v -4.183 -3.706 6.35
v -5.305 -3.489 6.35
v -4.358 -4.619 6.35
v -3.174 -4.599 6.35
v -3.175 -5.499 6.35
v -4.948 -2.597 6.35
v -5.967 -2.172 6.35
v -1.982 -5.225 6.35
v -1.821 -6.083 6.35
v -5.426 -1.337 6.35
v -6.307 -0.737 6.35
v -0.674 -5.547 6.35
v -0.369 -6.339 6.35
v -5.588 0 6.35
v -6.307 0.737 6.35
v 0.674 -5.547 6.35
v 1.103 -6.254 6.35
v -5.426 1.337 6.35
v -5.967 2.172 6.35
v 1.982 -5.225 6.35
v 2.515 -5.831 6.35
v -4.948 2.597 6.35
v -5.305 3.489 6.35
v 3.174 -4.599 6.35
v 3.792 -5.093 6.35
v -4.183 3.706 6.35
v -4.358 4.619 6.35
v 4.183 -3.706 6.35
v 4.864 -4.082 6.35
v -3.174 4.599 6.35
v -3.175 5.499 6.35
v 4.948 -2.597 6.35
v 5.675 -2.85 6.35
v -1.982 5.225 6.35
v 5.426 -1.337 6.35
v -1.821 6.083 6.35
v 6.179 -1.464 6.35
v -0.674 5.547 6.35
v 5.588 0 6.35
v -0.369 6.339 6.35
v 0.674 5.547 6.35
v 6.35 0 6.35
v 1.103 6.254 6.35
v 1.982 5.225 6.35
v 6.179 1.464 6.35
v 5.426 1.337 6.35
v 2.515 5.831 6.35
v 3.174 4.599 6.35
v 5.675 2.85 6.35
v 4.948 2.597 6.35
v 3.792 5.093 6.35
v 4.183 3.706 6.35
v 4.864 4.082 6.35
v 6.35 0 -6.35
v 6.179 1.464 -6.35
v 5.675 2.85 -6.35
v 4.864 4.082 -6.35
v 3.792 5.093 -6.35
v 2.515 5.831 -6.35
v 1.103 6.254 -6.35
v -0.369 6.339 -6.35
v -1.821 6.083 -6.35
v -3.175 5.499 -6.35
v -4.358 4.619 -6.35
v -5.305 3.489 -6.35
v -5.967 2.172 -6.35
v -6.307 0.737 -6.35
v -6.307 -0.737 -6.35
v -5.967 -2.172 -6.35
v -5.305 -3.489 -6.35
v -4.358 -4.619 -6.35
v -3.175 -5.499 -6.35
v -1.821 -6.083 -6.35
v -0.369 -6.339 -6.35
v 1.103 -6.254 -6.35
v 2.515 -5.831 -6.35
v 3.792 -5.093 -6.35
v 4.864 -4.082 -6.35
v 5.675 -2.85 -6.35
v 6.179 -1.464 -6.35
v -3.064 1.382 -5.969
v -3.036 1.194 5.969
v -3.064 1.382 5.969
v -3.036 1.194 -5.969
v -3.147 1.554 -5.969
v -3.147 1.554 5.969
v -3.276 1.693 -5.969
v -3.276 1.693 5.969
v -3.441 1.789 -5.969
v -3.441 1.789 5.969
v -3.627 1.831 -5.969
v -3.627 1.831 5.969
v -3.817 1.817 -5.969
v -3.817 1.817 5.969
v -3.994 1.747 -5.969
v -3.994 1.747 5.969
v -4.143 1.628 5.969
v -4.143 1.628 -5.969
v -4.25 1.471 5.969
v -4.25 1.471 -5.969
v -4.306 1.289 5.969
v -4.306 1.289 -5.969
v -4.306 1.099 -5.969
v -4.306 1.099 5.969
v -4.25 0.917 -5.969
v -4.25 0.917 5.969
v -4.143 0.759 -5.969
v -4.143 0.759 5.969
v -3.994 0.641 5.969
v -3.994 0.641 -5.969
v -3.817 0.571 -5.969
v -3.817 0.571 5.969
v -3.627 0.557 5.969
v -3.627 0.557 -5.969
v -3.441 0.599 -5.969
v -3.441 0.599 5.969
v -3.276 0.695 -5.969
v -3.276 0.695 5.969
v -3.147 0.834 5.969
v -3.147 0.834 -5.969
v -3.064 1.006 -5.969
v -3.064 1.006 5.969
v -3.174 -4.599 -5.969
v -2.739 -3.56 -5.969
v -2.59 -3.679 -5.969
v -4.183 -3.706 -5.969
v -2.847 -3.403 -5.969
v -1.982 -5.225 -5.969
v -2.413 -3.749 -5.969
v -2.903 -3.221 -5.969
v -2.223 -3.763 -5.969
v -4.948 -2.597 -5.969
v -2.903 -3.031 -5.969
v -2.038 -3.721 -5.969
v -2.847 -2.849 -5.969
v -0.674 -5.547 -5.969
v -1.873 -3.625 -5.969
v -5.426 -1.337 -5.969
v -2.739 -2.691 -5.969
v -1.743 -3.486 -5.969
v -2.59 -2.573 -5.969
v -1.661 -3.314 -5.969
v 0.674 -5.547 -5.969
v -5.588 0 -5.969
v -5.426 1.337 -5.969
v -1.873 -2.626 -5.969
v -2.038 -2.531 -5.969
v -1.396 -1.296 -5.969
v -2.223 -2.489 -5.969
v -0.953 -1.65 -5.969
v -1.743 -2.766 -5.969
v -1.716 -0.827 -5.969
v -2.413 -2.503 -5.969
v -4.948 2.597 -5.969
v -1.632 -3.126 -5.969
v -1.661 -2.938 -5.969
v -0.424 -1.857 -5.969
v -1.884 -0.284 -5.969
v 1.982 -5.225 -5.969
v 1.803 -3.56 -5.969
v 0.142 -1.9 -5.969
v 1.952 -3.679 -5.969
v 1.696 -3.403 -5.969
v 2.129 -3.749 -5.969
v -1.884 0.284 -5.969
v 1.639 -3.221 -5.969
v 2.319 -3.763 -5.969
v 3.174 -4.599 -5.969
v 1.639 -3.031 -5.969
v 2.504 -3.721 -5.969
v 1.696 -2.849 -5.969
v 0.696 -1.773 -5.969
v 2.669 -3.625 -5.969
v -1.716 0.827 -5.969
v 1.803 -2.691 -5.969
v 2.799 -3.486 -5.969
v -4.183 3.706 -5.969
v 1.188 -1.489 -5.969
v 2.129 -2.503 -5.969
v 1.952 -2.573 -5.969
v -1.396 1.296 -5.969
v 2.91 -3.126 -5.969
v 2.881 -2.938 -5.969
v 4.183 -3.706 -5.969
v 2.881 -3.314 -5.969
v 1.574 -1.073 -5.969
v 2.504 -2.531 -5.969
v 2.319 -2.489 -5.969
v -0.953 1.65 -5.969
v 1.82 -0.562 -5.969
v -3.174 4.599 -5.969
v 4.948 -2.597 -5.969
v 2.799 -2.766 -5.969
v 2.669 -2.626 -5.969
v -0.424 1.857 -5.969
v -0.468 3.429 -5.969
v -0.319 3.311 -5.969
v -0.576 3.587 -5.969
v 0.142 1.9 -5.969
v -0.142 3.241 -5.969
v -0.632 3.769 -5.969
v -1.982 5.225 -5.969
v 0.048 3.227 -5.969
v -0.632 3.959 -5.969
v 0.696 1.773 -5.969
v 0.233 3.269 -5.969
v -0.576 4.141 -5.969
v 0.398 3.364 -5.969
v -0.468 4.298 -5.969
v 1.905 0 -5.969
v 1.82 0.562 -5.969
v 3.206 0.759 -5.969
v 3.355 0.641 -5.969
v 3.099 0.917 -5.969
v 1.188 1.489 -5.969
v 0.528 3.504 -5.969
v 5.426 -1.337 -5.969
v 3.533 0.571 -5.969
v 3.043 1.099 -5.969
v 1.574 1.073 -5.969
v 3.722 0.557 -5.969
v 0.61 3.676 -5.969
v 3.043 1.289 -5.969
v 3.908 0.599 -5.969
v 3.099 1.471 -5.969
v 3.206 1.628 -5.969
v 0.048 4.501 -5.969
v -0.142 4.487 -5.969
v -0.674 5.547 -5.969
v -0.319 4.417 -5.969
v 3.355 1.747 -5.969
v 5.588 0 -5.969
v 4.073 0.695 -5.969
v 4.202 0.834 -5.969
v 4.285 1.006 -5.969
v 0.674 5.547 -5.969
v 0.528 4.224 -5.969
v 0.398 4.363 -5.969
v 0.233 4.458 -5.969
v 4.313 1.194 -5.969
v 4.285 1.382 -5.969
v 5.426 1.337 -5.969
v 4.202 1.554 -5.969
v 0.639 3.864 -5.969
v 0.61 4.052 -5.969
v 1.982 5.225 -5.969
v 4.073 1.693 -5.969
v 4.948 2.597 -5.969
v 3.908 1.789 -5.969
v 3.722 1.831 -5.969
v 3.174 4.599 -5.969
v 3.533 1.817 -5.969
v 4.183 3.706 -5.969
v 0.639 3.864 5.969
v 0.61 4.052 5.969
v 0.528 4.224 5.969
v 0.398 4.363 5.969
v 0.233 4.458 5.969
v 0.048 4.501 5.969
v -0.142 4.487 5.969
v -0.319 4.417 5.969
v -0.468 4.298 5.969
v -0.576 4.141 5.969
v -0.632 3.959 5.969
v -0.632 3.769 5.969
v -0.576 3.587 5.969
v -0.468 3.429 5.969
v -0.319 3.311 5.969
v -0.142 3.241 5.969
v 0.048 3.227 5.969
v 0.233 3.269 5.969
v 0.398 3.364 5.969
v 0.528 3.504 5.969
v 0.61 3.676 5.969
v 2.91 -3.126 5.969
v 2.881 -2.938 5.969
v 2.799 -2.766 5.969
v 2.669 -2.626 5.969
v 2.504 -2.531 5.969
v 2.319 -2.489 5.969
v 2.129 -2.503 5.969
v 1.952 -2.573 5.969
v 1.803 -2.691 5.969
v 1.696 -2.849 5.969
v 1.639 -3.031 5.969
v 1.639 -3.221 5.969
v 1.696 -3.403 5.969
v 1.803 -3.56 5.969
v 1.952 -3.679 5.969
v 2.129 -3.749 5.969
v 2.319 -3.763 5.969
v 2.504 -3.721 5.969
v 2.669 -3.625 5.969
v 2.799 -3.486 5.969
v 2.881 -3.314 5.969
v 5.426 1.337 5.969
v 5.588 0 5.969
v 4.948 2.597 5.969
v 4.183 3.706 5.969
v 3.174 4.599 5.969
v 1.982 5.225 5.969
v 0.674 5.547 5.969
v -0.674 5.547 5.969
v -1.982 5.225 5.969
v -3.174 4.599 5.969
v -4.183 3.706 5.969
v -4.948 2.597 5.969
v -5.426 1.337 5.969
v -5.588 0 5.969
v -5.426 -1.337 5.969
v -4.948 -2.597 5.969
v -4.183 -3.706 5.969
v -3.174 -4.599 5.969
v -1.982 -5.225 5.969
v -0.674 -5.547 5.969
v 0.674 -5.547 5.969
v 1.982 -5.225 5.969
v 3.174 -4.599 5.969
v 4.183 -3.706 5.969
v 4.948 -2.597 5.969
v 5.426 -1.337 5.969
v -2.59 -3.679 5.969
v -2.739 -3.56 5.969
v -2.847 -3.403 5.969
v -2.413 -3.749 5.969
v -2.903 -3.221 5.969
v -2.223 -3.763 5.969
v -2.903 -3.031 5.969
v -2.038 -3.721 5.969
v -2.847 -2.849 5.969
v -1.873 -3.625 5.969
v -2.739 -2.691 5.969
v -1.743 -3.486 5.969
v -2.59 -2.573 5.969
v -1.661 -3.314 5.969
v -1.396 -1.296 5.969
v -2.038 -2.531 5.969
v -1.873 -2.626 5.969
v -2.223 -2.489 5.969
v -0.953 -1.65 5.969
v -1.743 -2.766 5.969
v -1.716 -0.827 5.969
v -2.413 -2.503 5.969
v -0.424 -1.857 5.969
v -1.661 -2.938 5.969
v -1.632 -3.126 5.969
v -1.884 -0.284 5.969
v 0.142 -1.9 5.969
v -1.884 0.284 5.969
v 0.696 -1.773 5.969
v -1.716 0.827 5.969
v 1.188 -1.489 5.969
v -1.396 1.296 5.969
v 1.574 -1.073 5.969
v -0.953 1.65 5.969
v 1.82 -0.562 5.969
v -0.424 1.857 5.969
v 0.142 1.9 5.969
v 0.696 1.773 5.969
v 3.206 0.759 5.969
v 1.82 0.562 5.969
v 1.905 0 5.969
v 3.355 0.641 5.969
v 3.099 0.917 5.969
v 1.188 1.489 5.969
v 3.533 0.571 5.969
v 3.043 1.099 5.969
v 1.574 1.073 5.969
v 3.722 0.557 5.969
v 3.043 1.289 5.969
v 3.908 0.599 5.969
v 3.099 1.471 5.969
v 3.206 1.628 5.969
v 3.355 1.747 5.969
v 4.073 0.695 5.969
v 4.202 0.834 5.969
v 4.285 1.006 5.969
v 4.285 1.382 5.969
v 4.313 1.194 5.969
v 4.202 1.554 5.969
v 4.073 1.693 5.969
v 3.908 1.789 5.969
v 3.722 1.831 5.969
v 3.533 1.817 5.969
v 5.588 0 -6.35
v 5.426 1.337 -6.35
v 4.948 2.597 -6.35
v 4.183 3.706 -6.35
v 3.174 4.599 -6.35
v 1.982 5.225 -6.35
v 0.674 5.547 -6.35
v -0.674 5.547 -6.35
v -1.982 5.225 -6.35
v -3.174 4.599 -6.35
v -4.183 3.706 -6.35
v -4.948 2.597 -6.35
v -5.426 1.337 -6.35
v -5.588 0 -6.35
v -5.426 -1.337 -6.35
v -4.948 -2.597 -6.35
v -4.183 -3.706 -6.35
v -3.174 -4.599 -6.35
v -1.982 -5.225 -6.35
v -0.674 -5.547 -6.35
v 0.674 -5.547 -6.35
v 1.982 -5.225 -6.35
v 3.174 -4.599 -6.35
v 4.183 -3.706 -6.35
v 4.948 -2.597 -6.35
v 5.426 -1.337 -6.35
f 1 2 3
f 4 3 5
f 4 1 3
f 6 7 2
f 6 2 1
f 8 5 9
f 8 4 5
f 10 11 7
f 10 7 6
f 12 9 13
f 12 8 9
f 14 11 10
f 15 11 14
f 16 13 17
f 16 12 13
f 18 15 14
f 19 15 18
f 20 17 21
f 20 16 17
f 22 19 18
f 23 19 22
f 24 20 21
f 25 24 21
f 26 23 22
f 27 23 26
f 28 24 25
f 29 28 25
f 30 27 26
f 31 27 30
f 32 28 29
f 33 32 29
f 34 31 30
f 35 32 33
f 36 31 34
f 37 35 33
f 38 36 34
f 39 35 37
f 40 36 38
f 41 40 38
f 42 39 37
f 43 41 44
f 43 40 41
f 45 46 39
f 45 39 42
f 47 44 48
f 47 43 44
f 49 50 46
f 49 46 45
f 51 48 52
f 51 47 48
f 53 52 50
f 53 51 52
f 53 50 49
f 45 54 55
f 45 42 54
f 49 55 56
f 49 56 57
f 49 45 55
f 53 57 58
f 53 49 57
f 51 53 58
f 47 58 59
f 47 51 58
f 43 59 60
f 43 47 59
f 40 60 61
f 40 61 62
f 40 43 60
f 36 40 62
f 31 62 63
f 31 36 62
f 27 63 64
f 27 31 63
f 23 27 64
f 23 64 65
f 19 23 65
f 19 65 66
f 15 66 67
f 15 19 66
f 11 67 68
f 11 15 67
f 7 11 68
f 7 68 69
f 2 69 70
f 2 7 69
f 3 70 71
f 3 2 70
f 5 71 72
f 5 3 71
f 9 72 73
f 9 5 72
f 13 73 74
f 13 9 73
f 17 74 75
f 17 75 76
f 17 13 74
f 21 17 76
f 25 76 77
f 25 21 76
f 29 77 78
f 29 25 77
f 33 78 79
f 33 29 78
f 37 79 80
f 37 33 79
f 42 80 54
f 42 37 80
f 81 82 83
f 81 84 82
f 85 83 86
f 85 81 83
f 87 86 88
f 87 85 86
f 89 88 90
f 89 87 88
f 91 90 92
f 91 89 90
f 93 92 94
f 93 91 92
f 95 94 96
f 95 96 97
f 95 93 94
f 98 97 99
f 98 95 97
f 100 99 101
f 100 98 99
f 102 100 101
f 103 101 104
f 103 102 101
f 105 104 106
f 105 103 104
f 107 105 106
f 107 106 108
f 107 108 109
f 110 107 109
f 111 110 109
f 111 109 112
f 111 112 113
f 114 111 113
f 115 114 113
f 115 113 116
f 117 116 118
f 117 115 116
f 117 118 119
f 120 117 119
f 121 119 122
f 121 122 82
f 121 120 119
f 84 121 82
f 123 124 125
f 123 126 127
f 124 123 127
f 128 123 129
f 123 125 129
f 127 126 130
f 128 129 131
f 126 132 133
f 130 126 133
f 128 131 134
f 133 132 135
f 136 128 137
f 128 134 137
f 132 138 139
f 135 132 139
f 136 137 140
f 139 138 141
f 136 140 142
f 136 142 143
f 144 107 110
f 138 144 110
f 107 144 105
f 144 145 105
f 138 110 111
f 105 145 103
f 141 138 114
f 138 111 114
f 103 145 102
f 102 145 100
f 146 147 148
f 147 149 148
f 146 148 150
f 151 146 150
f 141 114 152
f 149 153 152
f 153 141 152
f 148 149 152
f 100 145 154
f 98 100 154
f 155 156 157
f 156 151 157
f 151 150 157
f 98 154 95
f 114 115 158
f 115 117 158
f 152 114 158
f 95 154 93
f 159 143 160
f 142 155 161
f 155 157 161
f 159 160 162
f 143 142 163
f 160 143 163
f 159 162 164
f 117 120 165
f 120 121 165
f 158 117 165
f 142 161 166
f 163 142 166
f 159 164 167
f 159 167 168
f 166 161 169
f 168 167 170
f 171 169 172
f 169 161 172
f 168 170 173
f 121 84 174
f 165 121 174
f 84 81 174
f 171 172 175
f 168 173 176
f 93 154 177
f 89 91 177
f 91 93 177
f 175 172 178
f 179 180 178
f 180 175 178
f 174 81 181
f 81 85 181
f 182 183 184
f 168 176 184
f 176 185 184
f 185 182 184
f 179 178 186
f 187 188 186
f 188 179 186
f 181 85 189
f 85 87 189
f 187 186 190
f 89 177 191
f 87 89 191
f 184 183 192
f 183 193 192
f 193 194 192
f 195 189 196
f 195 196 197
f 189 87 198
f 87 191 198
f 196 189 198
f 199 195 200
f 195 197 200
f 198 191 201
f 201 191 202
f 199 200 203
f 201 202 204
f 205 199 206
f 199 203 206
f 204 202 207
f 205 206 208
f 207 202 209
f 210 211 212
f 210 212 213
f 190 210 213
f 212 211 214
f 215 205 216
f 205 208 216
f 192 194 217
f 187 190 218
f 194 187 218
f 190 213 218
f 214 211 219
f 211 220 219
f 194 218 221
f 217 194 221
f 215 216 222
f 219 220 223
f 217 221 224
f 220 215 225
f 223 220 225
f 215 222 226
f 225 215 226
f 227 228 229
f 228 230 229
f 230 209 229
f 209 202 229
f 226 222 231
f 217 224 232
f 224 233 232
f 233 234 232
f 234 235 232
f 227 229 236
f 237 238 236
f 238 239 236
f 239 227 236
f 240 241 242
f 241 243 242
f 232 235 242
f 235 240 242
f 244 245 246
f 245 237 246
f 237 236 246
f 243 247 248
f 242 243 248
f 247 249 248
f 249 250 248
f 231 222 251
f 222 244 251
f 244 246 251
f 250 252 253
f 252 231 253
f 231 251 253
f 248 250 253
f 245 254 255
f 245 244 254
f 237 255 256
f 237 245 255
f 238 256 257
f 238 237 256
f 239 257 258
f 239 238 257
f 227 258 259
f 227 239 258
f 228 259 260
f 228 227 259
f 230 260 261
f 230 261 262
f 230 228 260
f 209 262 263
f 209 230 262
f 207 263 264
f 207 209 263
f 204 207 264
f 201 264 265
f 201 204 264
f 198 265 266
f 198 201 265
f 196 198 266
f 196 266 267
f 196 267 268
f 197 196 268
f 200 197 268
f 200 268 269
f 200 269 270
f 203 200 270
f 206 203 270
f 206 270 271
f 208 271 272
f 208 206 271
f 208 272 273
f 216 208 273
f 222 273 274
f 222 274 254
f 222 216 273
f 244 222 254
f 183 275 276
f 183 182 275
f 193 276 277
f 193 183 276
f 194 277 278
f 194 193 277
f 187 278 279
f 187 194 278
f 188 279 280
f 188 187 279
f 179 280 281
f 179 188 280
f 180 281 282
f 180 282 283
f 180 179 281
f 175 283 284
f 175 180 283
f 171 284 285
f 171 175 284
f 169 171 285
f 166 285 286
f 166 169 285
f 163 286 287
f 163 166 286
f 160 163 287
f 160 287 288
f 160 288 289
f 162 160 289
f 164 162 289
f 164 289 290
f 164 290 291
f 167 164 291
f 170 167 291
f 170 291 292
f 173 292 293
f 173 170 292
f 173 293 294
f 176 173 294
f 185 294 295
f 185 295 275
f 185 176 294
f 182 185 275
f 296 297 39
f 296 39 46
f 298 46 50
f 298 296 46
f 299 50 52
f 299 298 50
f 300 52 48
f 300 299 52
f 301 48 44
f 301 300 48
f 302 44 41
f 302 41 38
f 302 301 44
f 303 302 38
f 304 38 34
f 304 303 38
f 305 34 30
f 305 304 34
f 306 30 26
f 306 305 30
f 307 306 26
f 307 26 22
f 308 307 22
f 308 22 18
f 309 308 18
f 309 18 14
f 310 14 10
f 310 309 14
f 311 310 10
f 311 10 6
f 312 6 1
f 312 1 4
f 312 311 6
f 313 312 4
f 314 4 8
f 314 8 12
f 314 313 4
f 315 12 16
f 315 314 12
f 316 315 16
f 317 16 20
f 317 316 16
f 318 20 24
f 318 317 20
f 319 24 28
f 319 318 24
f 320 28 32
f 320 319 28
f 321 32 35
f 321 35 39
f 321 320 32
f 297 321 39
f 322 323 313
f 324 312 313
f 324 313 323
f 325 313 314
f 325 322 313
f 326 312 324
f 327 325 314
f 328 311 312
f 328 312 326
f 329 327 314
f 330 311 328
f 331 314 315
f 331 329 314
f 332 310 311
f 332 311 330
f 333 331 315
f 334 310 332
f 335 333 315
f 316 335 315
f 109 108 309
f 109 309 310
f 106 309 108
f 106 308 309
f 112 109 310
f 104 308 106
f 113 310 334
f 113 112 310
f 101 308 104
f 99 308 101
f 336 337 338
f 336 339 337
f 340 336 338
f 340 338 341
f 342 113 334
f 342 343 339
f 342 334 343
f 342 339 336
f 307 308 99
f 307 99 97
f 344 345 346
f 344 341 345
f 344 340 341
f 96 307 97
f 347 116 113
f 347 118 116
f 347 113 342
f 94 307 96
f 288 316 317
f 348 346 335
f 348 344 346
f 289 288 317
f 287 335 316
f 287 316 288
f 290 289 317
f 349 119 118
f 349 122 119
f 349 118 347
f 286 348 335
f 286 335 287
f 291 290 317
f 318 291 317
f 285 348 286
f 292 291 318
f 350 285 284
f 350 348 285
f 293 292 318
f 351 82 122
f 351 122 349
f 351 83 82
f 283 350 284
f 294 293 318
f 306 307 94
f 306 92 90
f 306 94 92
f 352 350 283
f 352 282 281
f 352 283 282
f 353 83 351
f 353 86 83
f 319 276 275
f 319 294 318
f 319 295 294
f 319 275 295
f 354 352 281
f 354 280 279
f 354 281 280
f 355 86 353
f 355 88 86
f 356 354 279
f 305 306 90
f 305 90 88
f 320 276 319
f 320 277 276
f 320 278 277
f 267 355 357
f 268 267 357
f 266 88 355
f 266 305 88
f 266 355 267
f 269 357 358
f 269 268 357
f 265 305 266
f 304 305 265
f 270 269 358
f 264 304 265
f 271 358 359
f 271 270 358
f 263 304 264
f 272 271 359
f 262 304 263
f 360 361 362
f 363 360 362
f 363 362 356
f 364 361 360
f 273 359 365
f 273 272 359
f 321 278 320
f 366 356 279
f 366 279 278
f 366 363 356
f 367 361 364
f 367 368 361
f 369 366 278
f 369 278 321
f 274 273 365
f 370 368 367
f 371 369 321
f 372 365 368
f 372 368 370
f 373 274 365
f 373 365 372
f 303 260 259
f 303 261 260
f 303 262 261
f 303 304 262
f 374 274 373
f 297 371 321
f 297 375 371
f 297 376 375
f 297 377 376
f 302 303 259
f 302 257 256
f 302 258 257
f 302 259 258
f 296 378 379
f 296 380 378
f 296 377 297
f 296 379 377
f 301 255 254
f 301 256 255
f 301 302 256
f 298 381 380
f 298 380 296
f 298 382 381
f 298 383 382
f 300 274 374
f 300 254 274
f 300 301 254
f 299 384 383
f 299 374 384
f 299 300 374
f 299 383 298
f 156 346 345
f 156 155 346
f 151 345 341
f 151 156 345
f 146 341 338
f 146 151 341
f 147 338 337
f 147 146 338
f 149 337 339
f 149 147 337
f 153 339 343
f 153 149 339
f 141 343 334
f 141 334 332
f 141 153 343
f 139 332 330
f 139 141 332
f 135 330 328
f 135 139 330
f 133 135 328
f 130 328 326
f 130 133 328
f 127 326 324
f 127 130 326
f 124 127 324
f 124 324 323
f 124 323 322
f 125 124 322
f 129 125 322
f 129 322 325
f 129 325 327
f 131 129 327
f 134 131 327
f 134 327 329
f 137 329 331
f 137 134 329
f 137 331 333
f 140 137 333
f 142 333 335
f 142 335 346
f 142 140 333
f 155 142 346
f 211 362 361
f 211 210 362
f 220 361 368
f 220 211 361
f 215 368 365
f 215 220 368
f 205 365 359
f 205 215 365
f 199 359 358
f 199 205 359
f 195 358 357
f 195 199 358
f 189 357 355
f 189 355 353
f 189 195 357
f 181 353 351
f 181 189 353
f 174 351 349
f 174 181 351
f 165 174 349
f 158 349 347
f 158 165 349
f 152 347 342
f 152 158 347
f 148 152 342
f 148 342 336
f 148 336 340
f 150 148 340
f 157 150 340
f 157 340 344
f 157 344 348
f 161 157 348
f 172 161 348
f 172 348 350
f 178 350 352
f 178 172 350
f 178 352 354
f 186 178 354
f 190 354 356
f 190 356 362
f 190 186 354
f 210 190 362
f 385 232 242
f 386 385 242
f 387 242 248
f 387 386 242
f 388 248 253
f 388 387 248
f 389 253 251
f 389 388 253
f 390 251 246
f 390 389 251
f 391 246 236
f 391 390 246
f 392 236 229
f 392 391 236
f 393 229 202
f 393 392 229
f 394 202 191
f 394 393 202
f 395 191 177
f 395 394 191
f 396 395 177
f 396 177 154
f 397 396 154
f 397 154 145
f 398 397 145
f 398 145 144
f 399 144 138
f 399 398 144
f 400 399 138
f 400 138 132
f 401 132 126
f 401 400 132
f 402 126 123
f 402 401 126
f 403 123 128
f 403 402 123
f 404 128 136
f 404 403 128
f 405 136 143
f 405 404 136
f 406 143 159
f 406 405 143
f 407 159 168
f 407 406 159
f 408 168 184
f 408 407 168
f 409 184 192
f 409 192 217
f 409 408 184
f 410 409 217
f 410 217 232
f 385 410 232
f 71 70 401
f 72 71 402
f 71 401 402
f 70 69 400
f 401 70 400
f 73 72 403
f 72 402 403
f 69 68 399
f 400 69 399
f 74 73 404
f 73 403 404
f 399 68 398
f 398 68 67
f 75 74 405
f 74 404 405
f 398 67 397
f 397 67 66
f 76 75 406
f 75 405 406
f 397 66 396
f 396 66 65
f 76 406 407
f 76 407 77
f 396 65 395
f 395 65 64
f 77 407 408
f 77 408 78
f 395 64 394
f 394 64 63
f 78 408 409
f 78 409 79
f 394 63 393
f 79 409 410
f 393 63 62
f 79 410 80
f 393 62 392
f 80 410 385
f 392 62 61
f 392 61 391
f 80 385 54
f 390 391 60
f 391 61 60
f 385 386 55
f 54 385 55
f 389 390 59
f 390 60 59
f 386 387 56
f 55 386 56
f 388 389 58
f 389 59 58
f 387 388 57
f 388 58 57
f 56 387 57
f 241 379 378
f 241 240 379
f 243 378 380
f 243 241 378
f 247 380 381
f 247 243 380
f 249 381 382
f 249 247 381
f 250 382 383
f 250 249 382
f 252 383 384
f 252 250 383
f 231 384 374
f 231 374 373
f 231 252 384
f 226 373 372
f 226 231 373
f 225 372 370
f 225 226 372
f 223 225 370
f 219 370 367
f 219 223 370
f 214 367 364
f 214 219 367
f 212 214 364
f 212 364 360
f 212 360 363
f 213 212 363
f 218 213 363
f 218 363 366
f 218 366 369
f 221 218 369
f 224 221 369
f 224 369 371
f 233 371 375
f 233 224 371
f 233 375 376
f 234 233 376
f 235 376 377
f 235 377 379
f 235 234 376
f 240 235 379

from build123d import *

# Parameters (mm, degrees)
F0_R     = 6.35
F0_R_2   = 5.588
F1_DEPTH = 6.35
F0_R_3   = 0.638783
F0_R_4   = 1.905
F2_DEPTH = 5.969


with BuildPart() as f1:
    # F0 (on Top) → F1 (new body, symmetric)
    with BuildSketch(Plane.XY):
        Circle(F0_R)
        Circle(F0_R_2, mode=Mode.SUBTRACT)
    extrude(amount=F1_DEPTH, both=True)

    # F0 (on Top) → F2 (join, symmetric)
    with BuildSketch(Plane.XY):
        Circle(F0_R_2)
        with Locations((-2.271086, -3.125882)):
            Circle(F0_R_3, mode=Mode.SUBTRACT)
        Circle(F0_R_4, mode=Mode.SUBTRACT)
        with Locations((2.271086, -3.125882)):
            Circle(F0_R_3, mode=Mode.SUBTRACT)
        with Locations((-3.674694, 1.193981)):
            Circle(F0_R_3, mode=Mode.SUBTRACT)
        with Locations((0, 3.863802)):
            Circle(F0_R_3, mode=Mode.SUBTRACT)
        with Locations((3.674694, 1.193981)):
            Circle(F0_R_3, mode=Mode.SUBTRACT)
    extrude(amount=F2_DEPTH, both=True)


solid = f1.part
